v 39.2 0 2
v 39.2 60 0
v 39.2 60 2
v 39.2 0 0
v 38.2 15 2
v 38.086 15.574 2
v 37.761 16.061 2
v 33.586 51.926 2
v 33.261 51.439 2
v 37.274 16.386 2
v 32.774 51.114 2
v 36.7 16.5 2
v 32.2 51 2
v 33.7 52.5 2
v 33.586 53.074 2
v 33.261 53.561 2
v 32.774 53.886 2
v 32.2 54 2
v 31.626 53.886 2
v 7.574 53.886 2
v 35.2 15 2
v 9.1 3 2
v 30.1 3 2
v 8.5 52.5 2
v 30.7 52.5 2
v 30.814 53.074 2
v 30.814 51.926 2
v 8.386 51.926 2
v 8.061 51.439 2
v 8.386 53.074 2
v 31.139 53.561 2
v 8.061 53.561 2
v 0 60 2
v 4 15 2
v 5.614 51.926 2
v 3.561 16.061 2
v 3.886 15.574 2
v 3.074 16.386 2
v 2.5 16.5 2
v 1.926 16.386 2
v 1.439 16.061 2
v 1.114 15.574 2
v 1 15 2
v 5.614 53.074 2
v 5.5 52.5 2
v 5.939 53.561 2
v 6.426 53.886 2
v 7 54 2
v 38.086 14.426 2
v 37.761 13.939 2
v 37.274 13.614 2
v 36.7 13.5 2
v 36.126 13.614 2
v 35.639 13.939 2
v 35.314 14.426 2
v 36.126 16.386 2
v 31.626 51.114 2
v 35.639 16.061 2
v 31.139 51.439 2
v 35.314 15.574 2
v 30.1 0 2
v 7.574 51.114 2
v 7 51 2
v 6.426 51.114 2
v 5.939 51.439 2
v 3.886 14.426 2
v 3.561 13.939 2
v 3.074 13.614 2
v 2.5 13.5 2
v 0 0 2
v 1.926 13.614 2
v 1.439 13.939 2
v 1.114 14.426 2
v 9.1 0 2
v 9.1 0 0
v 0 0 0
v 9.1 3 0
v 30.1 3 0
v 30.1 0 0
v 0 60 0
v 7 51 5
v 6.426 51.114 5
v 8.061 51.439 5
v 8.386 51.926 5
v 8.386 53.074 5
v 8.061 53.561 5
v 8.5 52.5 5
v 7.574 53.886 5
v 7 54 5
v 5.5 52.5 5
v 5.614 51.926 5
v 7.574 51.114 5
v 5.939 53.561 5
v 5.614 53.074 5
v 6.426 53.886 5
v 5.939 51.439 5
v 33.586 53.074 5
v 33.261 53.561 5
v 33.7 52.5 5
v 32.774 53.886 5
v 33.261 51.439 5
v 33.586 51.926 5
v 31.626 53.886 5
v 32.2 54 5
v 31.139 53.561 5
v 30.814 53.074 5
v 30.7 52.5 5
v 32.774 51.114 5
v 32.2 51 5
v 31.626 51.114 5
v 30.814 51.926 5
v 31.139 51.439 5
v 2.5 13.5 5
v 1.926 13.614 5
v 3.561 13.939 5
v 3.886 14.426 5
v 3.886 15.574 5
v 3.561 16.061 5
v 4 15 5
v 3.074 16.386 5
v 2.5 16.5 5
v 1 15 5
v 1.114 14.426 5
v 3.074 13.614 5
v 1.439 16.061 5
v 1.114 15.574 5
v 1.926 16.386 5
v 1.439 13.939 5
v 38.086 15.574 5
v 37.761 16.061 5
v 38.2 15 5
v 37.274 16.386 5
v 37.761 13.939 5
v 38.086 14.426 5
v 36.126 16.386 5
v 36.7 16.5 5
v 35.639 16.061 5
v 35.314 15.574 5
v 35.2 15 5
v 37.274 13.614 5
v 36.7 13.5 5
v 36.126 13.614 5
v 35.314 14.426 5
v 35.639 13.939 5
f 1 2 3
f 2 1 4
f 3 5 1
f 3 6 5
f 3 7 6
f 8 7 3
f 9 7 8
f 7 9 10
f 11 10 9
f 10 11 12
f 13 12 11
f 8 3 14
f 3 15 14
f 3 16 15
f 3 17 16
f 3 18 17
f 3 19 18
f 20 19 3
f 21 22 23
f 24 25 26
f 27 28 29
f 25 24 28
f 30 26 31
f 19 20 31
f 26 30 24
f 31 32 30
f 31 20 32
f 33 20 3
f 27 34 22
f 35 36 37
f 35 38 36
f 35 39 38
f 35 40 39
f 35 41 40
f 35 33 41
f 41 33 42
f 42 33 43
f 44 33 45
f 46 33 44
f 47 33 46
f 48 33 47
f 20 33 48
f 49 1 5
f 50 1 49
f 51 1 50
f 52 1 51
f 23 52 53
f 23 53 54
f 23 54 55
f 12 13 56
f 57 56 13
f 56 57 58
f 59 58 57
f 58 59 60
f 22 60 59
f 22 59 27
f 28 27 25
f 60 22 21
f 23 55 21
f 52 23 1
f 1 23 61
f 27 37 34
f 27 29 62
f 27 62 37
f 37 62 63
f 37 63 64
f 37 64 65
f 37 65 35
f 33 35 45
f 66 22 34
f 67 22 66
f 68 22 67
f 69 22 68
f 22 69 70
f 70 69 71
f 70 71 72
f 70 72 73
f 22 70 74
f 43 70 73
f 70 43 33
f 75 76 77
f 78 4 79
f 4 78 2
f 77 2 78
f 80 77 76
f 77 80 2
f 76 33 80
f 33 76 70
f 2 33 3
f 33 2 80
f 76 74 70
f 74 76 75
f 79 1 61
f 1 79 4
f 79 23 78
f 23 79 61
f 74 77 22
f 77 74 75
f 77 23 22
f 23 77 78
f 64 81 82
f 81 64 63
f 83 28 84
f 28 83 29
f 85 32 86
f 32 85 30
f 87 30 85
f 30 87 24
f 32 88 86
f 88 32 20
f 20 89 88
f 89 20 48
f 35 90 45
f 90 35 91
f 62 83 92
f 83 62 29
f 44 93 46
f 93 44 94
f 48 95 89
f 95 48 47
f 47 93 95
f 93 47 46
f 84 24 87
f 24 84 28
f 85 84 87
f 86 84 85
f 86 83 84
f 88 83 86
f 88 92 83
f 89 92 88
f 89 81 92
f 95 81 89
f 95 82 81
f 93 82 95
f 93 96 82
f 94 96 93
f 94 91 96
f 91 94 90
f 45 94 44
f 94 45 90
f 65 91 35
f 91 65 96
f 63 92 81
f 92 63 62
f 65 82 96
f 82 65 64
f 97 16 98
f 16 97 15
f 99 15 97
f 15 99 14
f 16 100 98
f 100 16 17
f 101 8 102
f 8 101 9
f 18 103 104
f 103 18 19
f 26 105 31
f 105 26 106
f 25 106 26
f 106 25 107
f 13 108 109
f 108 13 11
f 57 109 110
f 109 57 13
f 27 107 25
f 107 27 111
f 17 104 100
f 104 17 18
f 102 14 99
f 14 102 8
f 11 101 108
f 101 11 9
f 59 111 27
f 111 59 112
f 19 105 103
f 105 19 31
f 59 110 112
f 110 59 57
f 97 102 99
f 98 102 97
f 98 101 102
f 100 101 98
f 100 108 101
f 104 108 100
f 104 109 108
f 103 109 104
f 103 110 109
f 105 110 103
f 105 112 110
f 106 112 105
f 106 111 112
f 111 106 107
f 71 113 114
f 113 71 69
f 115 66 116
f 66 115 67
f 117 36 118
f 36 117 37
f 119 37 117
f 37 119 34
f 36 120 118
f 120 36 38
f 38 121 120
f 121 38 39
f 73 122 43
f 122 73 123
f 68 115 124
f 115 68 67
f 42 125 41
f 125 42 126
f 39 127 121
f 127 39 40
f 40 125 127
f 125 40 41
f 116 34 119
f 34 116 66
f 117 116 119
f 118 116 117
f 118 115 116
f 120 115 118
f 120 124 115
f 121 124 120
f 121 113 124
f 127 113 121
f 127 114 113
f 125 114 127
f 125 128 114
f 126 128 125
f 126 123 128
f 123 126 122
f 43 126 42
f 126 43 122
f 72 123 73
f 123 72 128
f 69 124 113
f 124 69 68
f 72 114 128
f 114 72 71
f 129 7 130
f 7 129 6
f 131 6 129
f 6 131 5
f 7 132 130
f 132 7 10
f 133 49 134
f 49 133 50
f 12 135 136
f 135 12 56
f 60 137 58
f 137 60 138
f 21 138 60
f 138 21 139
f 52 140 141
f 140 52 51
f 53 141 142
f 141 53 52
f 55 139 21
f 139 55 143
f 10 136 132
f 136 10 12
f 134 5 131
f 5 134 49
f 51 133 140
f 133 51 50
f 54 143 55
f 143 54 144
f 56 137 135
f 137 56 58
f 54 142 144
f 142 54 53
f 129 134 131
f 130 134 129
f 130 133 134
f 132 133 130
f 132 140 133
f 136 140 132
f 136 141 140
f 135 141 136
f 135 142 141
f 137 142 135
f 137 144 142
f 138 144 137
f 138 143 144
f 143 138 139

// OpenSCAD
module rc522_holder(){

// base dimensions
width=39.2;
height=60;
thickness=2;

// pin_spareout
pins_width=21;
pins_height=3;

// holders
holder_diameter = 3;
holder_height = 5;
holder_top_offset_x = 7;
holder_top_offset_y = height-7.5;    
holder_bottom_offset_x = 2.5;
holder_bottom_offset_y = 15;    
holder_fn = 16;

difference() {
cube([width,height,thickness]);

translate([(width-pins_width)/2,0,0])
    cube([pins_width,pins_height,thickness]);
}

// top left
translate([holder_top_offset_x,holder_top_offset_y,0])
    cylinder(h=holder_height, d=holder_diameter, $fn=holder_fn);
// top right
translate([width-holder_top_offset_x,holder_top_offset_y,0])
    cylinder(h=holder_height, d=holder_diameter, $fn=holder_fn);
    

translate([holder_bottom_offset_x,holder_bottom_offset_y,0])
    cylinder(h=holder_height, d=holder_diameter, $fn=holder_fn);

translate([width-holder_bottom_offset_x,holder_bottom_offset_y,0])
//translate([39.2-3.5,14.5,0])
    cylinder(h=holder_height, d=holder_diameter, $fn=holder_fn);
}


rc522_holder();
